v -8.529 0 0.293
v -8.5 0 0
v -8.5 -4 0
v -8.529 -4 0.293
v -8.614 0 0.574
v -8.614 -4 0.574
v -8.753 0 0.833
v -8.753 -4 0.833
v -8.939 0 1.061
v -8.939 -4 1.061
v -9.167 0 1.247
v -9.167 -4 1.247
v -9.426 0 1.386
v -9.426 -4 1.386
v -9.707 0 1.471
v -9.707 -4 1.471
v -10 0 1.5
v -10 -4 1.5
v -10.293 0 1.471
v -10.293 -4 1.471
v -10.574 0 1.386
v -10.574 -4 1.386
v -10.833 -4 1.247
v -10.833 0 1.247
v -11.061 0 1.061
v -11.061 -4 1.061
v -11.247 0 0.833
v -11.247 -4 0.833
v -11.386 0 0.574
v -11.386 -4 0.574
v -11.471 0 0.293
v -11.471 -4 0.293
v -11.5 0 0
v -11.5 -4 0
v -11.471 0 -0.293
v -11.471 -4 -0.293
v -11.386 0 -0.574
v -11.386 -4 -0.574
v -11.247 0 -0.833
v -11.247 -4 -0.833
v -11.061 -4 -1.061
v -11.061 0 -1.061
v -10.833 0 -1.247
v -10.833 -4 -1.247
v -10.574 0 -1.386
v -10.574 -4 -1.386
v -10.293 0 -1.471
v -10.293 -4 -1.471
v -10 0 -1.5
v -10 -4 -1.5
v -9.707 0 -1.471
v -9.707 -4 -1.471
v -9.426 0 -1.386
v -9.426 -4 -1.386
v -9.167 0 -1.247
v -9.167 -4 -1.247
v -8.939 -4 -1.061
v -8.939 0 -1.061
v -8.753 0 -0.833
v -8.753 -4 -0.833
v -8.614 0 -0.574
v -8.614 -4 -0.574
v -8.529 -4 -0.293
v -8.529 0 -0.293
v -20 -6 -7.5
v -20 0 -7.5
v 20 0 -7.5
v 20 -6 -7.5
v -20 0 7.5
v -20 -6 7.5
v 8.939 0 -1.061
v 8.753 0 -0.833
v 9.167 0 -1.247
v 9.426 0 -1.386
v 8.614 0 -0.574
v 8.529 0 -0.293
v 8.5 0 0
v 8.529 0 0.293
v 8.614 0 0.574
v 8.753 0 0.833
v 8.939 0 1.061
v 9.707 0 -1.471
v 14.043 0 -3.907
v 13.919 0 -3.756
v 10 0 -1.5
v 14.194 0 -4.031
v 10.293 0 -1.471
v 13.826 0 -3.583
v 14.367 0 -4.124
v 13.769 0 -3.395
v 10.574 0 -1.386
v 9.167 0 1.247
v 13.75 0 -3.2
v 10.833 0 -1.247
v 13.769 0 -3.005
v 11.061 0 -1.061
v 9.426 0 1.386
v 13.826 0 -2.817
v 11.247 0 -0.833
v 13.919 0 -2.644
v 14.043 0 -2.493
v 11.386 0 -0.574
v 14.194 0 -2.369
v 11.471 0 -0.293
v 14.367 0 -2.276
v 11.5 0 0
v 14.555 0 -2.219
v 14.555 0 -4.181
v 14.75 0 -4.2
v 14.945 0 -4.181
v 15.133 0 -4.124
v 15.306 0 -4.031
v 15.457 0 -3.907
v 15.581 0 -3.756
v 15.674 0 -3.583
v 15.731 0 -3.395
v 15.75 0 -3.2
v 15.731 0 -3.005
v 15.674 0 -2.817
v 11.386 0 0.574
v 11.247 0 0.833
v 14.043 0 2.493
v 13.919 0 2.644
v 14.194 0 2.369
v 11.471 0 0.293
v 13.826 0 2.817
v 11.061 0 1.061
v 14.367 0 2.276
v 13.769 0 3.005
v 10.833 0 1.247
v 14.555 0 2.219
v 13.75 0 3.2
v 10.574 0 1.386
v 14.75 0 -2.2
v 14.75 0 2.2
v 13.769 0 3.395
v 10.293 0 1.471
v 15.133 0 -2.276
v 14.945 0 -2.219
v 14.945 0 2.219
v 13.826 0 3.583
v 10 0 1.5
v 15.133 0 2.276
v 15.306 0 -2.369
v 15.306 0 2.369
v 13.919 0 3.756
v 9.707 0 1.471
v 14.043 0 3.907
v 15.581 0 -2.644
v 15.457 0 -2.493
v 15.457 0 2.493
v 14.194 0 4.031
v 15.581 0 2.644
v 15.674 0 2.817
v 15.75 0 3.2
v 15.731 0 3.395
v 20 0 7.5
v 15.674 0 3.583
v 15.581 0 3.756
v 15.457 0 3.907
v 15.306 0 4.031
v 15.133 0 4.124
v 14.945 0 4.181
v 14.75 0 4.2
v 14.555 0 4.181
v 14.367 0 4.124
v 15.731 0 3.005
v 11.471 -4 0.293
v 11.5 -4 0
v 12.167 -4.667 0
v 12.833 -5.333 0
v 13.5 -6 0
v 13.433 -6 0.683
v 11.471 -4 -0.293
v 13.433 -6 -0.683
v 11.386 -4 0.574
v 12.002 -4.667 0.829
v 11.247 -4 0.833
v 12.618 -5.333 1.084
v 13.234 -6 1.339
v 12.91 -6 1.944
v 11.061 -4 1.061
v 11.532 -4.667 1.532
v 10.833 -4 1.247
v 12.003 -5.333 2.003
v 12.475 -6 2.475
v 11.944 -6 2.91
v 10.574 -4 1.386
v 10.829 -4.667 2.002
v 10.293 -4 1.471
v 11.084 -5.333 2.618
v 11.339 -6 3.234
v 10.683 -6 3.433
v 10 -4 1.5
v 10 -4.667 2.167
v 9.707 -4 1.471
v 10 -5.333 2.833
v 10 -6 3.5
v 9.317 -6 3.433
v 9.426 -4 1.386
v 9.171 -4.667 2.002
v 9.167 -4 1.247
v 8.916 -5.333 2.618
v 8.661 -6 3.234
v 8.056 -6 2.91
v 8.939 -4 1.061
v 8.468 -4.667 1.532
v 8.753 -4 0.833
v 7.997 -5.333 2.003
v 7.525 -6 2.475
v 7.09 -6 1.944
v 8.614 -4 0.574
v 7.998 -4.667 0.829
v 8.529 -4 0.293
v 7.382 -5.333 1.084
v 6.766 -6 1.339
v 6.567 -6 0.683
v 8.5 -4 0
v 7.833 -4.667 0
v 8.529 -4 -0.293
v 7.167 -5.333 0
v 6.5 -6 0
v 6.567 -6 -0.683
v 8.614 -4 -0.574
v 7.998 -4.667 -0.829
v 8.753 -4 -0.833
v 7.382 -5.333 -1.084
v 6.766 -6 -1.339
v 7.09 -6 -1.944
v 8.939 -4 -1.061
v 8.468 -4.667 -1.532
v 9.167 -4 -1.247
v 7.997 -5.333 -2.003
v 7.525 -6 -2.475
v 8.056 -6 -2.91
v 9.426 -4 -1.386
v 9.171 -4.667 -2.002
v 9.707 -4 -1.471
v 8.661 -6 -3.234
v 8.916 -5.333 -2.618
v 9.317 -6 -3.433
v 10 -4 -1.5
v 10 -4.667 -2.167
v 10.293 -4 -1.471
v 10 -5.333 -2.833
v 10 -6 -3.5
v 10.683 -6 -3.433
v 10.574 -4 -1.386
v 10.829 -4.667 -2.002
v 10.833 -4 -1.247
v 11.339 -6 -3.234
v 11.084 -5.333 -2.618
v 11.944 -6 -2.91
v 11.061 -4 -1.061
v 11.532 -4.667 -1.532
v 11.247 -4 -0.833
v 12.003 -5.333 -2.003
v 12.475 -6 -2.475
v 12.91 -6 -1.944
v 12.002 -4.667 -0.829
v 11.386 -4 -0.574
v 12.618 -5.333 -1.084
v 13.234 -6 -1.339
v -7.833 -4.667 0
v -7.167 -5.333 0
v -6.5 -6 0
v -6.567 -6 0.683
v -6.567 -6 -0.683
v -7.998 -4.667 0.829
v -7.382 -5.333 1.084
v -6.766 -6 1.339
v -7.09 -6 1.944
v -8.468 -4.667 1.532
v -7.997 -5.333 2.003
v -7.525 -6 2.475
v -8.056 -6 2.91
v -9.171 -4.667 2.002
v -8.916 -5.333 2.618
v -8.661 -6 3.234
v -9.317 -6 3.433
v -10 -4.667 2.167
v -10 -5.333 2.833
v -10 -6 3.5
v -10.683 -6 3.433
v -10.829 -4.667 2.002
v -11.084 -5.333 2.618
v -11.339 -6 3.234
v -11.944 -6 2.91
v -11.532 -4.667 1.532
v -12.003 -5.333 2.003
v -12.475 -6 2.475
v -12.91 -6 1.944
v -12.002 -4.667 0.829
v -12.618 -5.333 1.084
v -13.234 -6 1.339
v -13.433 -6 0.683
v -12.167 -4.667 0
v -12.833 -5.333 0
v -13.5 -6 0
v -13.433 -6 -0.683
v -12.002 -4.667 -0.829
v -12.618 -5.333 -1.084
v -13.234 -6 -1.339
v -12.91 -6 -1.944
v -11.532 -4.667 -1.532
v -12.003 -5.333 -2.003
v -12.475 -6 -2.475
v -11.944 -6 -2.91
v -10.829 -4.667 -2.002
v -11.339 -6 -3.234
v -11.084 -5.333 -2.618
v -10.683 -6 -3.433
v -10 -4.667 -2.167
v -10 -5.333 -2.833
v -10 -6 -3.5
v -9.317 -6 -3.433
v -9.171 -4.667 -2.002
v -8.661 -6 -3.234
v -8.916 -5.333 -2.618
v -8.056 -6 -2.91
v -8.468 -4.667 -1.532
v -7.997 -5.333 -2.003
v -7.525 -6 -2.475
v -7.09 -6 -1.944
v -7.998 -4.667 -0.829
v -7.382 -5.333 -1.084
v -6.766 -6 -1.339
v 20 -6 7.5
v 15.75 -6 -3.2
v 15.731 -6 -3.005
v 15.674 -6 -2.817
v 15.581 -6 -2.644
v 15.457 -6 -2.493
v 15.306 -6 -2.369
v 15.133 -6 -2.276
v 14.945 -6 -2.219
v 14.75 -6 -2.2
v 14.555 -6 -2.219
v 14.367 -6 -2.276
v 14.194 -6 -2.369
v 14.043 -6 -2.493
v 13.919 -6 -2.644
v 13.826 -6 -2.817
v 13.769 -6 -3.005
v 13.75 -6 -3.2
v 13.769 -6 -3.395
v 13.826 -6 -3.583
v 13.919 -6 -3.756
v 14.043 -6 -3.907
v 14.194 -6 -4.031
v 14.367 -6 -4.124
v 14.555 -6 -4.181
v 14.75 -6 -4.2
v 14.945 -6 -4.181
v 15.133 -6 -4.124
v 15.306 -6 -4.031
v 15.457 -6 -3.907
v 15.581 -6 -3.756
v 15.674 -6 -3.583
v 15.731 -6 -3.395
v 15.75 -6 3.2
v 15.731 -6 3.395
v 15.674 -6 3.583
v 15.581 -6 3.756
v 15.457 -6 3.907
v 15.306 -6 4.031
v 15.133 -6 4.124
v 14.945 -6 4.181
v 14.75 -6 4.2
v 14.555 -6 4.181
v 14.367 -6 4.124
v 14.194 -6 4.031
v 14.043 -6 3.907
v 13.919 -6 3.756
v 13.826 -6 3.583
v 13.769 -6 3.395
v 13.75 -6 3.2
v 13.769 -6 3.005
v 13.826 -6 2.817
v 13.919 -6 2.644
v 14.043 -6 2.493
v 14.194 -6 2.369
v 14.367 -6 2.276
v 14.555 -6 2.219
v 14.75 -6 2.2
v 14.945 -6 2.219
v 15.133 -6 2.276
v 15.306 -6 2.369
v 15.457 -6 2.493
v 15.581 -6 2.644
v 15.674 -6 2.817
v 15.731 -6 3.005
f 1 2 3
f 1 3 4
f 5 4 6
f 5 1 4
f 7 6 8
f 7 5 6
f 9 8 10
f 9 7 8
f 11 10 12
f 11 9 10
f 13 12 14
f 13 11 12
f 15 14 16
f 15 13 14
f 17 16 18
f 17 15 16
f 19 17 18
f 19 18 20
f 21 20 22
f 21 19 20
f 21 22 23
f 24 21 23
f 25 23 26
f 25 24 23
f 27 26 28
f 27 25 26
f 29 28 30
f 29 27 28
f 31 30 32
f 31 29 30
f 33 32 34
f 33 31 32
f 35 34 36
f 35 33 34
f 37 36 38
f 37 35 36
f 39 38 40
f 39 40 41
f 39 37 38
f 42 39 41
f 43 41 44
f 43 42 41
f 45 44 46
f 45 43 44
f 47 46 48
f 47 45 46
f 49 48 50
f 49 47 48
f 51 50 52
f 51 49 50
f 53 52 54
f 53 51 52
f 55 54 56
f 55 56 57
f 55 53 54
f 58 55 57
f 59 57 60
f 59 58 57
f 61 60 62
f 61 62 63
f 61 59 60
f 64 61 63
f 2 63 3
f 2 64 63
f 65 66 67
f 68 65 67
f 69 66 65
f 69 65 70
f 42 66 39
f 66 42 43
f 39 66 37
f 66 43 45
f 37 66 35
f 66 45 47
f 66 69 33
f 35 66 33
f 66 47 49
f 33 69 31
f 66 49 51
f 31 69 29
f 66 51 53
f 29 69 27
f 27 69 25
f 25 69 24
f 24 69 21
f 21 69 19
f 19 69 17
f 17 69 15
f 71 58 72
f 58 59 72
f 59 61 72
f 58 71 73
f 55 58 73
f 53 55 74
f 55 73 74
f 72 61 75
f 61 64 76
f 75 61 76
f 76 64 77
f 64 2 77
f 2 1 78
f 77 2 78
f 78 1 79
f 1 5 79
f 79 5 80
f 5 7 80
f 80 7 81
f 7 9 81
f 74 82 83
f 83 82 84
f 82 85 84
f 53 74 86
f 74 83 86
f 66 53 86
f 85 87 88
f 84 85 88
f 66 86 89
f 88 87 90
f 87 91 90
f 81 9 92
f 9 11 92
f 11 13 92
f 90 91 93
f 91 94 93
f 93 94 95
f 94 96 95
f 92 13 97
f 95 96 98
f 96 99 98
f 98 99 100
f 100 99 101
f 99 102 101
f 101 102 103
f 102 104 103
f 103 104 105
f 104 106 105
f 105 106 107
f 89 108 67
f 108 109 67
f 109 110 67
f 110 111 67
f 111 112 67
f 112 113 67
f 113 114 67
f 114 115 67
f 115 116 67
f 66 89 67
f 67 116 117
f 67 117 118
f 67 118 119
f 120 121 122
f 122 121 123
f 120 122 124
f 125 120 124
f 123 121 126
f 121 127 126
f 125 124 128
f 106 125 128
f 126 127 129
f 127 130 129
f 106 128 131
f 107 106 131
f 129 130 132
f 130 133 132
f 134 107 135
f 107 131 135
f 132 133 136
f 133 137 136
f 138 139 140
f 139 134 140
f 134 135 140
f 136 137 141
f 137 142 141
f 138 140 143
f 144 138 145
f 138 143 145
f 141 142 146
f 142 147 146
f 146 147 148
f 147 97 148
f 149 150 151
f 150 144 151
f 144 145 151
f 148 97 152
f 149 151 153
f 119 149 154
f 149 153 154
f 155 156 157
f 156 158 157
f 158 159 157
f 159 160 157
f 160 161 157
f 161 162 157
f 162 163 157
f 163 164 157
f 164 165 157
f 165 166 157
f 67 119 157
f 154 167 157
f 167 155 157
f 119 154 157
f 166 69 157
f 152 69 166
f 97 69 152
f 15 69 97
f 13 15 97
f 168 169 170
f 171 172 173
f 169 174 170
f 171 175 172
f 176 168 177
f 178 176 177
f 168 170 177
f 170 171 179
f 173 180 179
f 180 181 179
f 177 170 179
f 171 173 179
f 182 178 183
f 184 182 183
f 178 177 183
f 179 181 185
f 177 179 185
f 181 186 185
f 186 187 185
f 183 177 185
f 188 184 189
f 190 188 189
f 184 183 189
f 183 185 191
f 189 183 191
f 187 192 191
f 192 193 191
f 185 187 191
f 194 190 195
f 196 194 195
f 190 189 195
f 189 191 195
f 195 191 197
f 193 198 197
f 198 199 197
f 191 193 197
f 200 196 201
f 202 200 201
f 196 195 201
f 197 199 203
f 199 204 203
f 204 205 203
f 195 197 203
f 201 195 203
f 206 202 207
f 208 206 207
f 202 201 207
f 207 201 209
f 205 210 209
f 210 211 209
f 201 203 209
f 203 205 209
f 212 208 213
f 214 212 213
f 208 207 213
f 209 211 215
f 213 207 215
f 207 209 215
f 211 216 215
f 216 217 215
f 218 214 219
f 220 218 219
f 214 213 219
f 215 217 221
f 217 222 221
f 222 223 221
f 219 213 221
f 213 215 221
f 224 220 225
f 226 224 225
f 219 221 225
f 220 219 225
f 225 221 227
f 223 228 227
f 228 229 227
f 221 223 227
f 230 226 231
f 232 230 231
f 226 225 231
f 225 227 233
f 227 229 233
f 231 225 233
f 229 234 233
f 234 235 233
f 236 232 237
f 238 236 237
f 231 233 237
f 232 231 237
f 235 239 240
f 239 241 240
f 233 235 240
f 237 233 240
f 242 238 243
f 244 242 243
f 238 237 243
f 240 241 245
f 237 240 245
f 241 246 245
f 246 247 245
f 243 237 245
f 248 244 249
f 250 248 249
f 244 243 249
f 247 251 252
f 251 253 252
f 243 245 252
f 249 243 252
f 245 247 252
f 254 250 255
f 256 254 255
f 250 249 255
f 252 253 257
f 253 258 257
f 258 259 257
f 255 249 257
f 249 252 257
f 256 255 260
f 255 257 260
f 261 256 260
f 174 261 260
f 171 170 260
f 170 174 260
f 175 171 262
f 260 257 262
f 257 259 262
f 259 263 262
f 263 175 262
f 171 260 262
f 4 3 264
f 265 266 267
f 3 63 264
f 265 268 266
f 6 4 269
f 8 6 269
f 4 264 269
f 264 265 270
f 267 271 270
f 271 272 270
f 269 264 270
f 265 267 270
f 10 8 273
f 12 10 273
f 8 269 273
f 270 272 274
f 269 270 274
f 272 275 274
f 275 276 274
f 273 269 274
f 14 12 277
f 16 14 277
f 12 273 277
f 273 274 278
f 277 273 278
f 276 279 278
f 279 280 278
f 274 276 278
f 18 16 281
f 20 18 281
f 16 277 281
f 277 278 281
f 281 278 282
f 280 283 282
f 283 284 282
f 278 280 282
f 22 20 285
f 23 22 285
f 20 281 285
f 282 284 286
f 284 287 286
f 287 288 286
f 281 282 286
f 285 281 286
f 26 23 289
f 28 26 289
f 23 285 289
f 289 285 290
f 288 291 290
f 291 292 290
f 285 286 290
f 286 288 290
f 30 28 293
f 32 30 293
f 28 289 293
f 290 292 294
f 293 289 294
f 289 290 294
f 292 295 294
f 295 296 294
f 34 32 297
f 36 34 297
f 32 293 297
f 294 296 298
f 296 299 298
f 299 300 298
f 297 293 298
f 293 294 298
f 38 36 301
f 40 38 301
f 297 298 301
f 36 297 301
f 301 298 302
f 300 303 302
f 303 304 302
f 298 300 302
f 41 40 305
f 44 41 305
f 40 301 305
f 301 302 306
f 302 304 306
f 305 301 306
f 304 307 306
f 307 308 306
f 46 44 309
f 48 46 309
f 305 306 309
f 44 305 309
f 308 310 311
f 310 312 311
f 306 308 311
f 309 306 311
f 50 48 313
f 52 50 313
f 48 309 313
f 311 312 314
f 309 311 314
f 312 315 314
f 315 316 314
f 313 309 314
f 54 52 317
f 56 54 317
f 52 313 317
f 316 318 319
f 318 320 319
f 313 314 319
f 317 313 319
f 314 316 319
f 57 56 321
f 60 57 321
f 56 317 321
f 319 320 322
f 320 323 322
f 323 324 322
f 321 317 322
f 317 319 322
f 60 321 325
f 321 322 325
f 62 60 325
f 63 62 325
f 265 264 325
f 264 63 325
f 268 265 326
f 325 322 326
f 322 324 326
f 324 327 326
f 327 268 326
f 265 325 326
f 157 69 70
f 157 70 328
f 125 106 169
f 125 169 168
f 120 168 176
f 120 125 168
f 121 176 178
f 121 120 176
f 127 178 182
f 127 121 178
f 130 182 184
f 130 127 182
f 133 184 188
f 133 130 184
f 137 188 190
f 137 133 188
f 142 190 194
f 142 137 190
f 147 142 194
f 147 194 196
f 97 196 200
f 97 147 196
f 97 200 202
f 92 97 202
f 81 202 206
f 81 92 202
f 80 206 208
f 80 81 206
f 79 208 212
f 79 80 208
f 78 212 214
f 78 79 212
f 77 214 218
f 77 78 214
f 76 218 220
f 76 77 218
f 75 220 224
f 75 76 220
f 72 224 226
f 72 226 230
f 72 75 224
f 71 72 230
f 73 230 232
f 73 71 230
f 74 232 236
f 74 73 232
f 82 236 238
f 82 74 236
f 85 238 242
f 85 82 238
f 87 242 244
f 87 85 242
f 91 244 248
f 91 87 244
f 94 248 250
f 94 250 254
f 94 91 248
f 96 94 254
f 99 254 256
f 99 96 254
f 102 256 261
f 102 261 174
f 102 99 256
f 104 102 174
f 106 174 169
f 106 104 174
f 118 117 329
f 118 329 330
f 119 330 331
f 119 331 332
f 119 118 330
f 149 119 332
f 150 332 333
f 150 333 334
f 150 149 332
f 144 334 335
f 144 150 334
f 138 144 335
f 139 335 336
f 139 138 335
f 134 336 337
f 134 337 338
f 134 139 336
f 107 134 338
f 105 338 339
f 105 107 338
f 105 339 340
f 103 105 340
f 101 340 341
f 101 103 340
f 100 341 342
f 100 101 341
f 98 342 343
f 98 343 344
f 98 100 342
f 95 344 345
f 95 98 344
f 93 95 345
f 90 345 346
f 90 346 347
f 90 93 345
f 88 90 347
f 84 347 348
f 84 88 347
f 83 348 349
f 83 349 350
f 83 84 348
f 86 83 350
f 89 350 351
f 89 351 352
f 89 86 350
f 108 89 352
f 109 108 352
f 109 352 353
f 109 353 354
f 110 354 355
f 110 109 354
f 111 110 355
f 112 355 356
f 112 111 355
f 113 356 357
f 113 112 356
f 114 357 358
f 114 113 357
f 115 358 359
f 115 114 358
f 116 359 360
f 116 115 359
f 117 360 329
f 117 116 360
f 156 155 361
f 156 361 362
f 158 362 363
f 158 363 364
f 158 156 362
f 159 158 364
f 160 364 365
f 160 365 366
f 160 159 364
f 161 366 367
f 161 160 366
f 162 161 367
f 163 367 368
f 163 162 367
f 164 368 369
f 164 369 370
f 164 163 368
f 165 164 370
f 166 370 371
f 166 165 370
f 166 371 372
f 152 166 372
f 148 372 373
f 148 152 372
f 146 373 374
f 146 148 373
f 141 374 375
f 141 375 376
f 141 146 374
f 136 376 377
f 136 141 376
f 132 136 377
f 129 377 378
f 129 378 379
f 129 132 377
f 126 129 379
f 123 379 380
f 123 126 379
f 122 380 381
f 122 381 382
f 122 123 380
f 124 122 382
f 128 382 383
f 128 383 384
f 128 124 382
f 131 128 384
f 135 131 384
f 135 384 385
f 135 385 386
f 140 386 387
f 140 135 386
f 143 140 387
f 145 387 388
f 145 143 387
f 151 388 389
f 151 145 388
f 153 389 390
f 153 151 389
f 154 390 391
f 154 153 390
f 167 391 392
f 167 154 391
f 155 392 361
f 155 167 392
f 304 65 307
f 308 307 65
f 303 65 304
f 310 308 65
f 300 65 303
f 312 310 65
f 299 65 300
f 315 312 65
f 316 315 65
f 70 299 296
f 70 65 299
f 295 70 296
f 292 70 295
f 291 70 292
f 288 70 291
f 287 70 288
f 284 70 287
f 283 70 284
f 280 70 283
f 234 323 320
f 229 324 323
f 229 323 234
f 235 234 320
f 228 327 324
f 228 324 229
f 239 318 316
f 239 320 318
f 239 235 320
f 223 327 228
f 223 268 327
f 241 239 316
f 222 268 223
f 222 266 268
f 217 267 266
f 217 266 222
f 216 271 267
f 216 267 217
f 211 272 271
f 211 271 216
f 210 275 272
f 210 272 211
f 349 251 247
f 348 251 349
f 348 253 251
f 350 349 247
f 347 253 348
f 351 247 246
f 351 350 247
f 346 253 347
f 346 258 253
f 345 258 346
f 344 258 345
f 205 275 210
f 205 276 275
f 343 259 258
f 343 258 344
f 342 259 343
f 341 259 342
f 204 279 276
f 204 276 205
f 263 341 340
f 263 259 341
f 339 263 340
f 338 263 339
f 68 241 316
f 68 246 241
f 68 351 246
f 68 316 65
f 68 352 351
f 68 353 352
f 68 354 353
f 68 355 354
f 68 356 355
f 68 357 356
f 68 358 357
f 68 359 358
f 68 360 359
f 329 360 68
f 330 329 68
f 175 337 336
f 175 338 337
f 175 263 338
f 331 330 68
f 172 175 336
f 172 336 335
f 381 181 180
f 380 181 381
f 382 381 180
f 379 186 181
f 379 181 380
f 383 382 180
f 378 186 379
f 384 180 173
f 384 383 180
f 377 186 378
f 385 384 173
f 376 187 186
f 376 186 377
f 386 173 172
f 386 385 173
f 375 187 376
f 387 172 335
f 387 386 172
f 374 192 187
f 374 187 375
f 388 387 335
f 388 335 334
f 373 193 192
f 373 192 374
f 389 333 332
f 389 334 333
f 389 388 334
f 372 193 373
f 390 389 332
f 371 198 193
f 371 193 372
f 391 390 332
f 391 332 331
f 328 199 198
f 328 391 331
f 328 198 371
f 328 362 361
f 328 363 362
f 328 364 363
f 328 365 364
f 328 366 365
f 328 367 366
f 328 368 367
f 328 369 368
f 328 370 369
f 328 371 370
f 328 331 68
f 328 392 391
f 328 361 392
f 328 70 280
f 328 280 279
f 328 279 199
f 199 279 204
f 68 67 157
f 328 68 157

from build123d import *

# Parameters (mm, degrees)
F0_W     = 40
F0_H     = 15
F0_R     = 1
F0_R_2   = 1.5
F1_DEPTH = 6
F2_SIZE  = 2


with BuildPart() as f1:
    # F0 (on Front) → F1 (new body)
    with BuildSketch(Plane.XZ):
        Rectangle(F0_W, F0_H)
        with Locations((14.75, -3.2)):
            Circle(F0_R, mode=Mode.SUBTRACT)
        with Locations((-10, 0)):
            Circle(F0_R_2, mode=Mode.SUBTRACT)
        with Locations((10, 0)):
            Circle(F0_R_2, mode=Mode.SUBTRACT)
        with Locations((14.75, 3.2)):
            Circle(F0_R, mode=Mode.SUBTRACT)
    extrude(amount=F1_DEPTH)

    # F2
    f2_edges = [f1.edges().sort_by_distance(p)[0] for p in [
        (-11.5, -6, 0),
        (8.5, -6, 0),
    ]]
    chamfer(f2_edges, length=F2_SIZE)


solid = f1.part
